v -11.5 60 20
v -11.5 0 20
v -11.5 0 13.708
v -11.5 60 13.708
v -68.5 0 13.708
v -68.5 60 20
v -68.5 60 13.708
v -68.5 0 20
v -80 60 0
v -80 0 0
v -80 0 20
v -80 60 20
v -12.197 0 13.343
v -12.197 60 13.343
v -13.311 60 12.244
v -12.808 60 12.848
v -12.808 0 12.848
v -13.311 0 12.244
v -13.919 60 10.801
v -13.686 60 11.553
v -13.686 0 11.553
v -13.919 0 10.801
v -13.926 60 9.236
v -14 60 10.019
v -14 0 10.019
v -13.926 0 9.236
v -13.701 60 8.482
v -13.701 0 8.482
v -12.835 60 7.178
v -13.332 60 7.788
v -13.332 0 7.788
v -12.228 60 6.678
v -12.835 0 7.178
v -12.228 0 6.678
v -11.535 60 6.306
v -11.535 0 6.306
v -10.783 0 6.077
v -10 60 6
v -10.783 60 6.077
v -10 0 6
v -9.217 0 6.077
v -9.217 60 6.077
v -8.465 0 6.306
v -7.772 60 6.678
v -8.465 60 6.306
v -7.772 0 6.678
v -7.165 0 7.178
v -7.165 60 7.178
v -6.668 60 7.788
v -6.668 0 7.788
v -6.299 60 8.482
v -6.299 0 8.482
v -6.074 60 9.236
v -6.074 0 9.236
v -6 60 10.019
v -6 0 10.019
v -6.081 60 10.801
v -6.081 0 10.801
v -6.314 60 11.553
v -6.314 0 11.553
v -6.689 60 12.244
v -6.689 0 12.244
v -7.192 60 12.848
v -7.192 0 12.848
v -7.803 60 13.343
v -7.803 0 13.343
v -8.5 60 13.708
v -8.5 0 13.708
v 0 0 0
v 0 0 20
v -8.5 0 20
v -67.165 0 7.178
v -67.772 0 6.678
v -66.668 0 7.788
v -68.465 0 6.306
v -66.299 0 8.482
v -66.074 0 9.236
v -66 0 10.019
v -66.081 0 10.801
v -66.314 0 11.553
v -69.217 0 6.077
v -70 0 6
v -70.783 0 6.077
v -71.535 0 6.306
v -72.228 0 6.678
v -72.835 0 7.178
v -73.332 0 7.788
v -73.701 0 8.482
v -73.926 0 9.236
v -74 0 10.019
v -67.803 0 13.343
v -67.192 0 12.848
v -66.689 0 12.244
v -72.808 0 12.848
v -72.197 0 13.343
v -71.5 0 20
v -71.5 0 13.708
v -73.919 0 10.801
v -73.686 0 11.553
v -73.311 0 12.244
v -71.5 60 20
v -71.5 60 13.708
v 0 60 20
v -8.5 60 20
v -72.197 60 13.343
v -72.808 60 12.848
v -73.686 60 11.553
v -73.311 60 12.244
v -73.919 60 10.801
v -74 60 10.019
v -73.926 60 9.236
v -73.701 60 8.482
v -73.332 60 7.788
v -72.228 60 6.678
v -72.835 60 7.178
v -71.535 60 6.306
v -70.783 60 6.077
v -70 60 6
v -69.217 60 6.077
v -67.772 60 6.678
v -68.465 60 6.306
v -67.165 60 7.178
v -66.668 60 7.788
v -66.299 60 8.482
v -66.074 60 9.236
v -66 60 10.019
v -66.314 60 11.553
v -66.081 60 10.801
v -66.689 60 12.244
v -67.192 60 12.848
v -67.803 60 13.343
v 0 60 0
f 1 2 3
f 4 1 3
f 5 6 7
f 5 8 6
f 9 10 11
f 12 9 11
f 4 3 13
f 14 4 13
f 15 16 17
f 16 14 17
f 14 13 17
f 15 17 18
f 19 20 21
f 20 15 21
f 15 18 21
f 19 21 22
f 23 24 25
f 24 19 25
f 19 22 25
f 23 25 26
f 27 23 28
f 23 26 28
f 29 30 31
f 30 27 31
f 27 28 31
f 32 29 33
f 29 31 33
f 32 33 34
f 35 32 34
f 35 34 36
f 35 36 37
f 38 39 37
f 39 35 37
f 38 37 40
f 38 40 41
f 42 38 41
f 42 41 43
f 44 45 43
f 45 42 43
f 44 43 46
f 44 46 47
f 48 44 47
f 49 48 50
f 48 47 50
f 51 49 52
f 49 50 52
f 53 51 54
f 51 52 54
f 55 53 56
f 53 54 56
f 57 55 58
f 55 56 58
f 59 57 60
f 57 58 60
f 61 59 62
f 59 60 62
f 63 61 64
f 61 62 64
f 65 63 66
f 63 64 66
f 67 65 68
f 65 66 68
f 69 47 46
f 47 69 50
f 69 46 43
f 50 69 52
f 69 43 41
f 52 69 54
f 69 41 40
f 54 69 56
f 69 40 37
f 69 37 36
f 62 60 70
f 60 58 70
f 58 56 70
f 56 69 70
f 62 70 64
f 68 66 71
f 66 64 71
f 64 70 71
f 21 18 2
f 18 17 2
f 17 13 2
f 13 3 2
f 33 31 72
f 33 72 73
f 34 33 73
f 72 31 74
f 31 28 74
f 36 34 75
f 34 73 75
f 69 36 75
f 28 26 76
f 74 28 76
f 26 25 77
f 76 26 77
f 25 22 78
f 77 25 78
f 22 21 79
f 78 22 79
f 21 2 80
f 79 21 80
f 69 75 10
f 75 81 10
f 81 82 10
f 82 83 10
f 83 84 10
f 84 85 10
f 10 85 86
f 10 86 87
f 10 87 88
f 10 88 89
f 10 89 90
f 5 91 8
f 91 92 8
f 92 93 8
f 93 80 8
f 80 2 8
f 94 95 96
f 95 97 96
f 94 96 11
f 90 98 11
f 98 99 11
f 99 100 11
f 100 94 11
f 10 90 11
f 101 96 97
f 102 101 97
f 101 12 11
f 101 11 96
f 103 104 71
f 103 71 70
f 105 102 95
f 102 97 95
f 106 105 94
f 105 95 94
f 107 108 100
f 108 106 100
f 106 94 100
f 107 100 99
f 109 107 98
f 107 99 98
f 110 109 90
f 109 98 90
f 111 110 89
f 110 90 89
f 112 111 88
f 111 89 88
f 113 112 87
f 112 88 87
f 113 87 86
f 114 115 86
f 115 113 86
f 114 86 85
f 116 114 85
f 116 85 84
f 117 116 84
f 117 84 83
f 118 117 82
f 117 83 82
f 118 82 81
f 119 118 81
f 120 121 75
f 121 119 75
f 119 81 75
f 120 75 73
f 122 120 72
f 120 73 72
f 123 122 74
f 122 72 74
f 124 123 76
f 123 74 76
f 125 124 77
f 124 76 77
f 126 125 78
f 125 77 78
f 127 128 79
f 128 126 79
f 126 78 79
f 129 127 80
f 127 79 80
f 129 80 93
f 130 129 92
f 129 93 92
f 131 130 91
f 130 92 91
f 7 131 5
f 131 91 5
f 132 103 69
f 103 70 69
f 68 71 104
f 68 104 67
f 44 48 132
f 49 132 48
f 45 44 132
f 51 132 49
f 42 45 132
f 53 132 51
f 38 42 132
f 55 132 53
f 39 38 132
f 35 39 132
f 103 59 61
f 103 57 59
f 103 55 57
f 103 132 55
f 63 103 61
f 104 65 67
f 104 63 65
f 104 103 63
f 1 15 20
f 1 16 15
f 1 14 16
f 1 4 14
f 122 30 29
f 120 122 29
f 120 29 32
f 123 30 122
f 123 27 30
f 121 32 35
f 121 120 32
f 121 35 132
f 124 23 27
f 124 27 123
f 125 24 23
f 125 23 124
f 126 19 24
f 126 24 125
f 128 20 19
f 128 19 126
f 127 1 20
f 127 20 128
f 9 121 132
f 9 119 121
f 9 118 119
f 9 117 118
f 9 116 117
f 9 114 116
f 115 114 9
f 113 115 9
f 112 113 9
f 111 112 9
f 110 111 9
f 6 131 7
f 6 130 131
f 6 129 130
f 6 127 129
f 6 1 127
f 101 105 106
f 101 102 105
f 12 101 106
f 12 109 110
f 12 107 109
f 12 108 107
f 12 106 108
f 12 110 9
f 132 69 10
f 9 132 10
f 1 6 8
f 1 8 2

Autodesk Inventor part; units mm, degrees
ref_plane "YZ Plane" through (0, 0, 0) normal (1, 0, 0) x (0, 1, 0)
ref_plane "XZ Plane" through (0, 0, 0) normal (0, 1, 0) x (-1, 0, 0)
ref_plane "XY Plane" through (0, 0, 0) normal (0, 0, 1) x (1, 0, 0)
sketch "Sketch1" plane through (0, 0, 0) normal (0, 1, 0) x (-1, 0, 0)
  arc A0 (8.5, 13.7081) -> (11.5, 13.7081) centre (10, 10) ccw
  line L0 (8.5, 20) -> (8.5, 13.7081)
  line L1 (11.5, 20) -> (11.5, 13.7081)
  line L2 (10, 20) -> (10, 18.7339)
  line L3 (20, 20) -> (10, 20)
  line L4 (8.5, 20) -> (0, 20)
  line L5 (0, 20) -> (0, 0)
  line L6 (0, 0) -> (20, 0)
  line L7 (20, 0) -> (20, 20)
  arc A1 (68.5, 13.7081) -> (71.5, 13.7081) centre (70, 10) ccw
  line L8 (68.5, 20) -> (68.5, 13.7081)
  line L9 (71.5, 20) -> (71.5, 13.7081)
  line L10 (70, 20) -> (70, 18.3732)
  line L11 (80, 20) -> (70, 20)
  line L12 (68.5, 20) -> (60.9559, 20)
  line L13 (60.9559, 20) -> (60.9559, 0)
  line L14 (60.9559, 0) -> (80, 0)
  line L15 (80, 0) -> (80, 20)
  line L16 (60.9559, 0) -> (20, 0)
  line L17 (20, 0) -> (20, 20)
  line L18 (20, 20) -> (60.9559, 20)
  line L19 (60.9559, 20) -> (60.9559, 0)
  dimension "d2" = 8
  dimension "d7" = 1.5
  dimension "d8" = 1.5
  dimension "d16" = 10
  dimension "d17" = 8
  dimension "d18" = 1.5
  dimension "d19" = 1.5
  dimension "d20" = 10
  dimension "d22" = 80
  dimension "d23" = 10
  dimension "d24" = 0
  dimension "d25" = 60
  dimension "d26" = 20
  dimension "d27" = 20
  dimension "d28" = 20
  dimension "d29" = 20
  dimension "d30" = 10
  dimension "d31" = 10
  dimension "d32" = 20
extrude "Extrusion1" add sketch "Sketch1" along normal blind 60
equation "\"d2\" = RodDiameter"
equation "\"d17\" = d2"
equation "\"RodDiameter\" = 8"
equation "\"VerticalBearingOD\" = 16"
equation "\"PrintingClearance\" = 0.2"
equation "\"d21\" = 8"
properties part number "GantryHolder"
